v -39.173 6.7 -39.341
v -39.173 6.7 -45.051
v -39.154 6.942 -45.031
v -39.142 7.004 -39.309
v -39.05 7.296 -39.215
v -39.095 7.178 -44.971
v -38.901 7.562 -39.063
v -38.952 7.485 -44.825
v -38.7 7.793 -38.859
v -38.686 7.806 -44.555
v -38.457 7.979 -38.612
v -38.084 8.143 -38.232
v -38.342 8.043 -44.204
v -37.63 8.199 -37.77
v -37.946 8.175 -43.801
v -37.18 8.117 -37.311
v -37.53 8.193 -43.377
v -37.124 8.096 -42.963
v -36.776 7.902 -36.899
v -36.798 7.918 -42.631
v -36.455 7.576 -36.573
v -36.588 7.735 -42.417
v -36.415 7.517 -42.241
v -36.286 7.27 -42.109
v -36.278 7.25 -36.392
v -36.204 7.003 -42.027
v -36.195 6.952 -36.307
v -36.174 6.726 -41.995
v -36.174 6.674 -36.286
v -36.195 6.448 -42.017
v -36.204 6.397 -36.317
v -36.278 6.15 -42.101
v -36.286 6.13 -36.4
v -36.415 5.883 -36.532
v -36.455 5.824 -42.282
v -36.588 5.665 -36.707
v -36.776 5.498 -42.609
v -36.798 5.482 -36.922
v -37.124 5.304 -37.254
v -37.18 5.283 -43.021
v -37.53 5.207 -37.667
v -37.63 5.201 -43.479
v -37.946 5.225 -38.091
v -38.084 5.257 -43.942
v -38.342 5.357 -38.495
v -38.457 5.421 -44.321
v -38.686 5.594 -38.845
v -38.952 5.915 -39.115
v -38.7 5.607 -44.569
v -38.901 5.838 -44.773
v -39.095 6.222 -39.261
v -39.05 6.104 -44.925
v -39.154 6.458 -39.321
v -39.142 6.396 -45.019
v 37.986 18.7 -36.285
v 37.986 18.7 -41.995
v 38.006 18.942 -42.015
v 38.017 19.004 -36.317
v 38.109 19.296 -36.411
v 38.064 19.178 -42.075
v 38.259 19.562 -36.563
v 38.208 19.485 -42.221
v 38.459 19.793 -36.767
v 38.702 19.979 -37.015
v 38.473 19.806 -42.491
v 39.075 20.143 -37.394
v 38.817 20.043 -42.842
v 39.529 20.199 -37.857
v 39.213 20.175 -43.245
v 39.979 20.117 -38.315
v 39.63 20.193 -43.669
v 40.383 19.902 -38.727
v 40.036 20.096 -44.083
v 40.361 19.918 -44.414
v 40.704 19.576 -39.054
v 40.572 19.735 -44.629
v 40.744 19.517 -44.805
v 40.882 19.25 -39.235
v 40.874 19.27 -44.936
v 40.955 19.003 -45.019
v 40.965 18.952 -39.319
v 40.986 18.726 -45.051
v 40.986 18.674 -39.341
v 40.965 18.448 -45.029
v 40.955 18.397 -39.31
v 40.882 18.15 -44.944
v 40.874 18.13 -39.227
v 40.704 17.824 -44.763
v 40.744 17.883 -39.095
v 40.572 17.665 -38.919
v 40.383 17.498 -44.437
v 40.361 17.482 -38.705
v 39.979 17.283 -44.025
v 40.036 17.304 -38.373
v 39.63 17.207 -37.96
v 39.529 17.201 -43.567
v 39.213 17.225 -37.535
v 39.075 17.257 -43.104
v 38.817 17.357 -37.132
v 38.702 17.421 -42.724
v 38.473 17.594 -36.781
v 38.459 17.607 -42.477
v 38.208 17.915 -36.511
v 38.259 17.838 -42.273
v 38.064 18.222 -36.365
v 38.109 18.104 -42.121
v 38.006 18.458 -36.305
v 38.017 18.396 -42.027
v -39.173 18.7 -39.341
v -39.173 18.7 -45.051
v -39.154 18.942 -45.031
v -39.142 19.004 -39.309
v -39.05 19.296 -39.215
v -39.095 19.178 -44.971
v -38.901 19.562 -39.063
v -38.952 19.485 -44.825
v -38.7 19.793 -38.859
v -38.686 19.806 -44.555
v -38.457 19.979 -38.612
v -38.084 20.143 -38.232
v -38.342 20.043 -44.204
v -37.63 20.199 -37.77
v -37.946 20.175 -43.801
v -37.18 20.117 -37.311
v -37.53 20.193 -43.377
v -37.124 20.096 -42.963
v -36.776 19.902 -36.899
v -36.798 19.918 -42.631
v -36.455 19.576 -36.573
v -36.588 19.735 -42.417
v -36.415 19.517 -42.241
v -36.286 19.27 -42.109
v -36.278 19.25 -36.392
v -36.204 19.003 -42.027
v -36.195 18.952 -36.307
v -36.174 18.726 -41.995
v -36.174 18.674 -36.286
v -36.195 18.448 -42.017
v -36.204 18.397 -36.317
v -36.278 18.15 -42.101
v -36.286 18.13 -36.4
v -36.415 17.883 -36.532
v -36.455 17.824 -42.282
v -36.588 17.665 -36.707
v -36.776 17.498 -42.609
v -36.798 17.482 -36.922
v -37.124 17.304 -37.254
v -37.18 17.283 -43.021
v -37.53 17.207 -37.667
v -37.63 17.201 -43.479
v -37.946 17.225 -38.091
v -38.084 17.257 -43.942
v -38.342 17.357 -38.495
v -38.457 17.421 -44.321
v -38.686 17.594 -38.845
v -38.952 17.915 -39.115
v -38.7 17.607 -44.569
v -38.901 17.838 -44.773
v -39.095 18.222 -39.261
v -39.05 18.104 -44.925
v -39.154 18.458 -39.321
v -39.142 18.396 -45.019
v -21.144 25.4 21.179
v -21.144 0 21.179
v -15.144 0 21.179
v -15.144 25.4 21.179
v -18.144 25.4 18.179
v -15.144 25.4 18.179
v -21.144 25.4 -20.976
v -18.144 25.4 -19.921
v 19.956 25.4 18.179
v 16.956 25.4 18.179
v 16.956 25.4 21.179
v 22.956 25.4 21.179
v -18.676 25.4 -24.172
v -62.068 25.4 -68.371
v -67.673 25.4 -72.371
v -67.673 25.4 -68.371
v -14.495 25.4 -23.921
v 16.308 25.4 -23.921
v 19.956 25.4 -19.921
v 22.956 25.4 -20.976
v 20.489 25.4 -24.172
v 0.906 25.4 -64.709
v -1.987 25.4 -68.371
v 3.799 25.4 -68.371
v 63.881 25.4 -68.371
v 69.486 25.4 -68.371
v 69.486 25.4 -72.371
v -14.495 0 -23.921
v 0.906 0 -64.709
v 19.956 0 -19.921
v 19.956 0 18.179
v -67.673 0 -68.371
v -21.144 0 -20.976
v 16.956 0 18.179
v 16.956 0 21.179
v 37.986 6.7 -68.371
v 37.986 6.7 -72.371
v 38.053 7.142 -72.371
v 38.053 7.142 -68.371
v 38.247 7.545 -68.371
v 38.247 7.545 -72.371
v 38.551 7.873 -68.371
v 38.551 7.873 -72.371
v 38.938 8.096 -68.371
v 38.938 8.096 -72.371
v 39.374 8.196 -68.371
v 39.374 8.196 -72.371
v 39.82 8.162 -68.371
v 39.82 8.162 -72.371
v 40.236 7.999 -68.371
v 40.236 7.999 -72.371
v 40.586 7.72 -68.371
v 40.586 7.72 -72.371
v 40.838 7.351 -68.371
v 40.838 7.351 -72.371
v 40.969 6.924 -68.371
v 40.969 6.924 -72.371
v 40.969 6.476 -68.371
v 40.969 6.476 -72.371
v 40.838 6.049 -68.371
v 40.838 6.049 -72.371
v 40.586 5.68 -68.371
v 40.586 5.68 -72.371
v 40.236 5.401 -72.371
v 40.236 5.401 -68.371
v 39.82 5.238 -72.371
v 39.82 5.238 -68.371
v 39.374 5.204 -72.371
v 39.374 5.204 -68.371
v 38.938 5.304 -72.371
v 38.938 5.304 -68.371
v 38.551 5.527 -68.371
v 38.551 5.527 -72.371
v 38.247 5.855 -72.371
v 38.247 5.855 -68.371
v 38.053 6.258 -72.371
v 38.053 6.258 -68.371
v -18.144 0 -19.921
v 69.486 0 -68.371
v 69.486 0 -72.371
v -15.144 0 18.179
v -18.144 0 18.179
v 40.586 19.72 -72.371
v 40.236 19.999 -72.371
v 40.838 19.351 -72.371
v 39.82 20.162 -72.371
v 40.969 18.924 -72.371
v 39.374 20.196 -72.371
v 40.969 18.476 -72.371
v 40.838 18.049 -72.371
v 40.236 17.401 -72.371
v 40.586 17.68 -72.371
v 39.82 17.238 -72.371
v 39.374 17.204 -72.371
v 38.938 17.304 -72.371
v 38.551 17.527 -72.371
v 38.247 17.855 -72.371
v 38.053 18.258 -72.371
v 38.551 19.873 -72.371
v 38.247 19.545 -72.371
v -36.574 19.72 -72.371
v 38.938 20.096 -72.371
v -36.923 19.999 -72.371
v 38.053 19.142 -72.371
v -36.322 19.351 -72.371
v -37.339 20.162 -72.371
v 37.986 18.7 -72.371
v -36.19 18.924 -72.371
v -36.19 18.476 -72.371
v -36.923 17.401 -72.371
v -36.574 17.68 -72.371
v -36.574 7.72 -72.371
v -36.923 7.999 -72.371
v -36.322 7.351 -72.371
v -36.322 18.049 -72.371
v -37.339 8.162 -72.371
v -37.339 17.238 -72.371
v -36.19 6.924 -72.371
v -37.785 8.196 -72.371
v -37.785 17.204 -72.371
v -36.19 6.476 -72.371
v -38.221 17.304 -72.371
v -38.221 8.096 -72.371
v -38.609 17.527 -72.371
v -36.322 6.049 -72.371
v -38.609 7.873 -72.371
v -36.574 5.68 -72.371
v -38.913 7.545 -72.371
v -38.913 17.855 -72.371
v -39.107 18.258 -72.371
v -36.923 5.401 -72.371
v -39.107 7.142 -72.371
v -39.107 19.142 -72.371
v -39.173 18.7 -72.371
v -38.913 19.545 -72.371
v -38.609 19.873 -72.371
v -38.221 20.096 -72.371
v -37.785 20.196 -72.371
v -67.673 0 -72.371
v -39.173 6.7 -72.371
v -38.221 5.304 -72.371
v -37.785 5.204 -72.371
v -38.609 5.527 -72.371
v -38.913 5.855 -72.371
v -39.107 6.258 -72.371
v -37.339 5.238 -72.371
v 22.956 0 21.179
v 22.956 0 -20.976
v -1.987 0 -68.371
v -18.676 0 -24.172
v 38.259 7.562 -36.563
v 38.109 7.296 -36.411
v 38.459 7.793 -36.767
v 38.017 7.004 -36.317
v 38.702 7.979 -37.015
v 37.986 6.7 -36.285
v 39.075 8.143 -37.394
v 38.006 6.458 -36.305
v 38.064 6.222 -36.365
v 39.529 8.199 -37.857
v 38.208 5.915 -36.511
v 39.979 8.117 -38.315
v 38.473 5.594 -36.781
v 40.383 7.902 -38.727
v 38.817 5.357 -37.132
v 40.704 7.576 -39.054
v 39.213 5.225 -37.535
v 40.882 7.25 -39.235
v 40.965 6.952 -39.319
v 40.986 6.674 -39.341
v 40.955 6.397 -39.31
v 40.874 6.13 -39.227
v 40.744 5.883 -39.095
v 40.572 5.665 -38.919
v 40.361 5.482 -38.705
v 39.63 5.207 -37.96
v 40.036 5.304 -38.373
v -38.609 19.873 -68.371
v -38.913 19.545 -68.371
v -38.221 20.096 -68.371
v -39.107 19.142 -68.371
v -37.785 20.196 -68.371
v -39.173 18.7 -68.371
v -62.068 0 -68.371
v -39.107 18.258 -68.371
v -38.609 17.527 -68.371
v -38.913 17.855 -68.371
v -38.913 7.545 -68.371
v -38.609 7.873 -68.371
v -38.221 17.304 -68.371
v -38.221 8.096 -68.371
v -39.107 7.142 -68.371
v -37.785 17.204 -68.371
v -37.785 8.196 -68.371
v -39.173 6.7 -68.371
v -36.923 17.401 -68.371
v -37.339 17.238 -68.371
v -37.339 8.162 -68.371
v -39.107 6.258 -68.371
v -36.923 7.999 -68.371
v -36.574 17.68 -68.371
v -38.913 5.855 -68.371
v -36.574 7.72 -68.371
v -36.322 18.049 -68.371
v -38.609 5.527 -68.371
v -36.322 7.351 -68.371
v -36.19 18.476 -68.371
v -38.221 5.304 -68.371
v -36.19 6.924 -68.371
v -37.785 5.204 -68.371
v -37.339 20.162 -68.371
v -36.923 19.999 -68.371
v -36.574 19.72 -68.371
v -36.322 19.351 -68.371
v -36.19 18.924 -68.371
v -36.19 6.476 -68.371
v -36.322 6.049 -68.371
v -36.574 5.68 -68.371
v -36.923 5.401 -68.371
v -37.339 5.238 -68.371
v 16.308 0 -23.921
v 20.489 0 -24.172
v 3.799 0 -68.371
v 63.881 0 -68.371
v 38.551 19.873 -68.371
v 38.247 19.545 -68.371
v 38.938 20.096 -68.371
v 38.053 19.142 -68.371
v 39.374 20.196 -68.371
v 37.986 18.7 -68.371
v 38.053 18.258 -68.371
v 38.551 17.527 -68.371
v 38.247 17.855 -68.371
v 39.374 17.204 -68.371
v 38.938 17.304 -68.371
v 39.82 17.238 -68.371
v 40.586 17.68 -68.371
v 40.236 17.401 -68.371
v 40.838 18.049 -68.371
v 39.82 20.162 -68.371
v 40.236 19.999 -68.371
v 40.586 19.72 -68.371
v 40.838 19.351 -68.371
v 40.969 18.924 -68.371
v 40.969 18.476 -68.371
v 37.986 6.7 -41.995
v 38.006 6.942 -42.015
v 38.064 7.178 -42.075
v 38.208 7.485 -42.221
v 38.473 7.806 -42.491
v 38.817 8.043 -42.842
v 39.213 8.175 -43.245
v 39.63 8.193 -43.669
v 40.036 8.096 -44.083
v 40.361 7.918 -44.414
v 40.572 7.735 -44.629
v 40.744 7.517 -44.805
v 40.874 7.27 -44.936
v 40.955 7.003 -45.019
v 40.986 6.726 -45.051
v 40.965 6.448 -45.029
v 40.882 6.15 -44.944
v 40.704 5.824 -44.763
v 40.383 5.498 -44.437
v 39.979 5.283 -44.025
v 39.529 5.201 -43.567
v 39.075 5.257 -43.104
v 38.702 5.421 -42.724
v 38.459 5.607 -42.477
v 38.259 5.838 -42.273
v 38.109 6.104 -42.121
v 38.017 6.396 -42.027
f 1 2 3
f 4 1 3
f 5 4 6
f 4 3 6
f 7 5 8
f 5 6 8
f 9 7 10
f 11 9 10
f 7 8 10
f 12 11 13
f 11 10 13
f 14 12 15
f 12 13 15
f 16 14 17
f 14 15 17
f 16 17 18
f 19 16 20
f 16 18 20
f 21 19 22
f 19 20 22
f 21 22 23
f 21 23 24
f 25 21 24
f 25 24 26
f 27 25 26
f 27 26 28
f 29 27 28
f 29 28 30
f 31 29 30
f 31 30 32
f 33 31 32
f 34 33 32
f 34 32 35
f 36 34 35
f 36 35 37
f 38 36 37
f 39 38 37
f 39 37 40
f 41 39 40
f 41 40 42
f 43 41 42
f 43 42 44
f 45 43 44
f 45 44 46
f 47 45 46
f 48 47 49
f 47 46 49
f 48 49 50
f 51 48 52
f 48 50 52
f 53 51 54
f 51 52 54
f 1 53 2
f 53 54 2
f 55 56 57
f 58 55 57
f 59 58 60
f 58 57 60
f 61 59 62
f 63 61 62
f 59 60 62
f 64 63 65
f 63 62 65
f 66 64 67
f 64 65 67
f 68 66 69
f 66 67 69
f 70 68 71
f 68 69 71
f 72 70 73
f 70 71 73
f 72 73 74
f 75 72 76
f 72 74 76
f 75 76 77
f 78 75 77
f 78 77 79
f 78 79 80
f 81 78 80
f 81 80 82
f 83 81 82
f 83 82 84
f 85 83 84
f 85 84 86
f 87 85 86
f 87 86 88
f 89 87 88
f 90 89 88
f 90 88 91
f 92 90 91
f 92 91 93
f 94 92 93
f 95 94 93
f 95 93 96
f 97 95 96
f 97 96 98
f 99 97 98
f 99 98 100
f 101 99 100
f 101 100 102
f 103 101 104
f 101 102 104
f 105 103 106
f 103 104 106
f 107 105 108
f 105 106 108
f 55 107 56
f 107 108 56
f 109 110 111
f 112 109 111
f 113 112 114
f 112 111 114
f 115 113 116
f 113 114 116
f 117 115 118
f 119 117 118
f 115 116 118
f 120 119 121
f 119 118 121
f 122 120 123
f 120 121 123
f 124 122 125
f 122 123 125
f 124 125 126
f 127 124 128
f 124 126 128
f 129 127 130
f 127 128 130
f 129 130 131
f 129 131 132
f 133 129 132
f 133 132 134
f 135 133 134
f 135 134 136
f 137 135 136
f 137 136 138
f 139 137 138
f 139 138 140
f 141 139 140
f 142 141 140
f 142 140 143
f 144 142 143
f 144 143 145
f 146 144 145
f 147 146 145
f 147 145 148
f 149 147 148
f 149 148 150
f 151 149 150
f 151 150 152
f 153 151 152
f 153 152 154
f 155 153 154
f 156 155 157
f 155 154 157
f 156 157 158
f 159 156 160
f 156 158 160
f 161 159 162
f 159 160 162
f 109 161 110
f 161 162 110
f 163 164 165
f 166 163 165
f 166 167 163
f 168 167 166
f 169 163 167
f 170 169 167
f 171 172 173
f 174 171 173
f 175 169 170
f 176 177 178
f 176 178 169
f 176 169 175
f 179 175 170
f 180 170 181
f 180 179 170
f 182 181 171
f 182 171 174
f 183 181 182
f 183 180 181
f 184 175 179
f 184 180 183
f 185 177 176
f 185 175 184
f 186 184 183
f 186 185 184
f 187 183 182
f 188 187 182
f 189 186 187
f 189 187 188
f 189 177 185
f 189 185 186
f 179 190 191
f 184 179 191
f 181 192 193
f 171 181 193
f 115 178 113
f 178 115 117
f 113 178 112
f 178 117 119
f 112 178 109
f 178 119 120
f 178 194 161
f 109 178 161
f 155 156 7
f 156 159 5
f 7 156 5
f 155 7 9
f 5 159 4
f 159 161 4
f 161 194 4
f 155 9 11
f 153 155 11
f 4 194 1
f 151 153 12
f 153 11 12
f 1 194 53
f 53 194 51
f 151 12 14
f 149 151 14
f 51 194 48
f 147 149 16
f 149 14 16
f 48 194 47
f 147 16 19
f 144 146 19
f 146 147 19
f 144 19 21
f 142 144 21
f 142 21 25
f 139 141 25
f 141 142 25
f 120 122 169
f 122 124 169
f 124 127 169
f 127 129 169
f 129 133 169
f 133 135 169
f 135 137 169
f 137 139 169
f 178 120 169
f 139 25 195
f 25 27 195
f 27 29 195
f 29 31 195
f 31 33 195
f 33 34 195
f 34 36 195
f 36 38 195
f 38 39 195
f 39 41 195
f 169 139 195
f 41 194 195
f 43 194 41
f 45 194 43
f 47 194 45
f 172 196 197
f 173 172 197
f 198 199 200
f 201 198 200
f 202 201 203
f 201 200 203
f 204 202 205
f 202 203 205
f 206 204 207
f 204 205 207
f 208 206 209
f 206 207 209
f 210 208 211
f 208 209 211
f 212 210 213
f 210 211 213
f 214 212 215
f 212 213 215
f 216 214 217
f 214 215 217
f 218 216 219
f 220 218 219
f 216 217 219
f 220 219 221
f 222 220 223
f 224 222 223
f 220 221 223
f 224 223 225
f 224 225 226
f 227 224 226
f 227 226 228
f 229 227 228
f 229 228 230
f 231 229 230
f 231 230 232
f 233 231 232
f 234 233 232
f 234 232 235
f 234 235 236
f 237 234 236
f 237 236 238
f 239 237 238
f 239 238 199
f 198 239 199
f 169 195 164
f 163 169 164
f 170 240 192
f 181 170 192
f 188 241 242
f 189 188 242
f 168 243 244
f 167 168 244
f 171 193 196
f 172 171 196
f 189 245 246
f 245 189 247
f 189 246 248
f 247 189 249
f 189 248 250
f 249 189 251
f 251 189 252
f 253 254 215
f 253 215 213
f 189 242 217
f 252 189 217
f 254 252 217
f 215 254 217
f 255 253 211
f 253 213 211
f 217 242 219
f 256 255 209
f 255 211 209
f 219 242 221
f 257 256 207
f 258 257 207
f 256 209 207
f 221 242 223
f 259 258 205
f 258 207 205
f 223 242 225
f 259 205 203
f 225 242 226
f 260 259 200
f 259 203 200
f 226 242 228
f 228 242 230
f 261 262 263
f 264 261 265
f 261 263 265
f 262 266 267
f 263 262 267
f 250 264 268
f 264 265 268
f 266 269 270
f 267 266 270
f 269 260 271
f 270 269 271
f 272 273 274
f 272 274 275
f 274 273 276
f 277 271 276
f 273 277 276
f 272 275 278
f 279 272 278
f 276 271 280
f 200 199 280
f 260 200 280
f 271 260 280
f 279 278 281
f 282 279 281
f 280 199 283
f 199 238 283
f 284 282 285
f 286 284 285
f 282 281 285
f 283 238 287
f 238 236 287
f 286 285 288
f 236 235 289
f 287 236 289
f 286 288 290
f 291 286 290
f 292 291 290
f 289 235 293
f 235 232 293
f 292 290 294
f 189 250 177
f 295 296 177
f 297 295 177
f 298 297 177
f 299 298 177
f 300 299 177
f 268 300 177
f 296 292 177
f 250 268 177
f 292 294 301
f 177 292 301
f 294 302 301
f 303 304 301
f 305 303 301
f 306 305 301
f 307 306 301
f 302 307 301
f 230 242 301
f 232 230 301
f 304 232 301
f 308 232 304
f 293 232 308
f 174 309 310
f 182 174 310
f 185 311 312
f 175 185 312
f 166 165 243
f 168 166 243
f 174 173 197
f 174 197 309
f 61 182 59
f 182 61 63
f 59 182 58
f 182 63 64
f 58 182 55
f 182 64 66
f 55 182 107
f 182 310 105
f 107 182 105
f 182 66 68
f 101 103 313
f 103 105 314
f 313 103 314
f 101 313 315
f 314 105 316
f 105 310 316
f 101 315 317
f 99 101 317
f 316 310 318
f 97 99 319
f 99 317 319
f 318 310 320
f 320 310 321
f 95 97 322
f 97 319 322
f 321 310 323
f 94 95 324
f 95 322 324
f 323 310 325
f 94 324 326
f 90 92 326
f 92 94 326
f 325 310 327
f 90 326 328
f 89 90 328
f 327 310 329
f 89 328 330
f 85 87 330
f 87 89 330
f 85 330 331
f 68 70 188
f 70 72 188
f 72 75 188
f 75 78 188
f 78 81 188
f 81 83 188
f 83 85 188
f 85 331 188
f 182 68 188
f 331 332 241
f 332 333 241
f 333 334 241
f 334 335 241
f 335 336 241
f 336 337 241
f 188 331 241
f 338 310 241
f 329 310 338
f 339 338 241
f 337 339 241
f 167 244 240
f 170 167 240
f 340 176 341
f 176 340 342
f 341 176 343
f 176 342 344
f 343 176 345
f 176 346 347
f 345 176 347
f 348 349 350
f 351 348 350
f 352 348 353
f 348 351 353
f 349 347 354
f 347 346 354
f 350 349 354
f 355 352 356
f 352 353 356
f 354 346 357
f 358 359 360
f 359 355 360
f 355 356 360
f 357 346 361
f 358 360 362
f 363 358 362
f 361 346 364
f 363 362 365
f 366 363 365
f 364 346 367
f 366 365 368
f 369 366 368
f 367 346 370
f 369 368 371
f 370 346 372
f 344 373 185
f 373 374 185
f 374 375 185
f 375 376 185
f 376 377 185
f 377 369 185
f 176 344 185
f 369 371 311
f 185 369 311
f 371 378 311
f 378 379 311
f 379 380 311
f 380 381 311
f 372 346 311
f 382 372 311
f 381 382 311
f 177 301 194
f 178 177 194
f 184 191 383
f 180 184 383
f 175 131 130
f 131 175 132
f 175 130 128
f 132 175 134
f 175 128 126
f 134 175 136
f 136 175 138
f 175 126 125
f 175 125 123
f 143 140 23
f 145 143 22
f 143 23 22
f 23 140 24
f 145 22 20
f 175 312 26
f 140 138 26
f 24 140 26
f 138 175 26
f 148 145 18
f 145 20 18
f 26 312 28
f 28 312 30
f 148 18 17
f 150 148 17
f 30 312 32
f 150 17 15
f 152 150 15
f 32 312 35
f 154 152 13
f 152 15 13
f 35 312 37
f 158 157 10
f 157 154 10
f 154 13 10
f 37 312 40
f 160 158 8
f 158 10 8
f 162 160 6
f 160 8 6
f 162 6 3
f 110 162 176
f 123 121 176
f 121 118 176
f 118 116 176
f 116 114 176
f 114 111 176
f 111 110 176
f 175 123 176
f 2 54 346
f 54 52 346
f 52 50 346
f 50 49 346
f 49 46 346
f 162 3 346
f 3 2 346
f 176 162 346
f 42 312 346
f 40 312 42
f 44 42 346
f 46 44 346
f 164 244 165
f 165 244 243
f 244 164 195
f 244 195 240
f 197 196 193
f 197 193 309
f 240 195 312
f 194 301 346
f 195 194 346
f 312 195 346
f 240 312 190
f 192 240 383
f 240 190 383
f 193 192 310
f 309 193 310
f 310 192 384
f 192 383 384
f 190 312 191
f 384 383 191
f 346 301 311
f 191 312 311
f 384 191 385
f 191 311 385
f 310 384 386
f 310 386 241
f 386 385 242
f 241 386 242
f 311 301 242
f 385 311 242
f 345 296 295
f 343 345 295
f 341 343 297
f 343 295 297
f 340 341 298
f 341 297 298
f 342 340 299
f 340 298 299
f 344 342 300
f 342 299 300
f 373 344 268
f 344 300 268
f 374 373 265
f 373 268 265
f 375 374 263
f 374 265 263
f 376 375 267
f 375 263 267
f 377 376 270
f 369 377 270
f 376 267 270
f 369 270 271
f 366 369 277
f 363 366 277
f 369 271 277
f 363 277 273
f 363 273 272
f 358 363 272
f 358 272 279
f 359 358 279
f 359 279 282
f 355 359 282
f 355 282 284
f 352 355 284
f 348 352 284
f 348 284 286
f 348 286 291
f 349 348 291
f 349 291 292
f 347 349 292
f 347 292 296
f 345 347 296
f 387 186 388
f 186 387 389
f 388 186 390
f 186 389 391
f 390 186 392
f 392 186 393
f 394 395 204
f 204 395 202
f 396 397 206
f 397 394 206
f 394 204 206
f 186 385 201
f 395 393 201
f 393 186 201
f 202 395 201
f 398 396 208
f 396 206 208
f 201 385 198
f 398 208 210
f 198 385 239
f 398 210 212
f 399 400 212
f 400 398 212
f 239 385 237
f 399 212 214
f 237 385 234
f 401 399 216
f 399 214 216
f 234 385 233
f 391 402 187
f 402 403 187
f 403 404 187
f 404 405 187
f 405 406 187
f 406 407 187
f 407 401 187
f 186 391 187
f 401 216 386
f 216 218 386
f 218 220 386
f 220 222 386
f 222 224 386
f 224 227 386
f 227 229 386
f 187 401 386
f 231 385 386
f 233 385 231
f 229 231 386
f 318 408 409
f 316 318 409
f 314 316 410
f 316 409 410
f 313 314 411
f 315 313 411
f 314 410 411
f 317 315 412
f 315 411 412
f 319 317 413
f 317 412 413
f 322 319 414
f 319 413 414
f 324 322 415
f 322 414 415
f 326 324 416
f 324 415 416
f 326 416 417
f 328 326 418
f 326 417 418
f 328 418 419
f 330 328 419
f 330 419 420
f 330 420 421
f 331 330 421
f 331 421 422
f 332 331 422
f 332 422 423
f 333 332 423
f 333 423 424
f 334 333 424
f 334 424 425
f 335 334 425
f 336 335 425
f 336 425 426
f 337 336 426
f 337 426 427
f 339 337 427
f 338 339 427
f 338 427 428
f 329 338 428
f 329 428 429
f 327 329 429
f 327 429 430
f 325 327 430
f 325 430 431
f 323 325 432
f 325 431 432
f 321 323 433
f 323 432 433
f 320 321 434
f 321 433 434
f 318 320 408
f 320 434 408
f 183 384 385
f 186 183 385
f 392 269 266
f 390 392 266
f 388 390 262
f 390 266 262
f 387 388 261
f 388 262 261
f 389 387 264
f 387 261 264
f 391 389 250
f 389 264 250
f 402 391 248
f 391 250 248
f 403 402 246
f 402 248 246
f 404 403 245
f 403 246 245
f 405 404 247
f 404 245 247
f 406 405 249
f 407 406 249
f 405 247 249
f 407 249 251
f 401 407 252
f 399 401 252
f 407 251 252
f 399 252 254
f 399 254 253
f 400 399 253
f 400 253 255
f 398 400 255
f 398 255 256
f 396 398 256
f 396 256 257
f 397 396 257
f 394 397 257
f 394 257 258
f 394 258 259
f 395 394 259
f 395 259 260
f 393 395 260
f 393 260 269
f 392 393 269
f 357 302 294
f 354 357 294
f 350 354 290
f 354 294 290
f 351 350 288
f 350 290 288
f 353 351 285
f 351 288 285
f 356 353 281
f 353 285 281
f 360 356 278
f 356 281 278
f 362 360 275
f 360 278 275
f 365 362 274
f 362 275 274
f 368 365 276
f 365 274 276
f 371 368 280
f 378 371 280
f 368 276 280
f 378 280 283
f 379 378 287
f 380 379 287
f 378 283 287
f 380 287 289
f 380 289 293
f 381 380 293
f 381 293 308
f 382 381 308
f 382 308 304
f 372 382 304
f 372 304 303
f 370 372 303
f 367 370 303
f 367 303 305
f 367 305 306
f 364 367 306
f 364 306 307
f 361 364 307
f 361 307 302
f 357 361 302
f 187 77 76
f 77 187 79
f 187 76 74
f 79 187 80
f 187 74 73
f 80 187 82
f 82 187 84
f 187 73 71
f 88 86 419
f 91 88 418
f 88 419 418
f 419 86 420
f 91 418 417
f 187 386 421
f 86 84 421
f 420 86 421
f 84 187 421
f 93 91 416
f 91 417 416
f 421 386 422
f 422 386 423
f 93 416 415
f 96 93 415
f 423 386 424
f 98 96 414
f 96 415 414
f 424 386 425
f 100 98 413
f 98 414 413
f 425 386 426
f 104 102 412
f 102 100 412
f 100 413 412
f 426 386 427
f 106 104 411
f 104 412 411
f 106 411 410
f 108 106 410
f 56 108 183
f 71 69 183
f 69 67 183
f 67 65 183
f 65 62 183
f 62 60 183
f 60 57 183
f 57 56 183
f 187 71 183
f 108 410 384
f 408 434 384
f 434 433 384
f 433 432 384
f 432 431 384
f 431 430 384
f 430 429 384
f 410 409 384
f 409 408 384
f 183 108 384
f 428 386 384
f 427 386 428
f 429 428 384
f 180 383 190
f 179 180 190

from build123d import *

# Parameters (mm, degrees)
BOSS_EXTRUDE1_DEPTH = 25.4
SKETCH2_R           = 1.5
CUT_EXTRUDE1_DEPTH  = 120.2689793


with BuildPart() as part:
    # Sketch1 → Boss-Extrude1 (new body)
    with BuildSketch(Plane(origin=(0, 0, 0), x_dir=(1, 0, 0), z_dir=(0, 1, 0))):
        Polygon((-21.143554781, 20.976139754), (-21.143554781, -21.178999859), (-15.143554781, -21.178999859), (-15.143554781, -18.178999859), (-18.143554781, -18.178999859), (-18.143554781, 19.921000141), (-19.143705232, 18.939106358), align=None)
        Polygon((16.956445219, -18.178999859), (16.956445219, -21.178999859), (22.956445219, -21.178999859), (22.956445219, 20.976139754), (20.956595671, 18.939106358), (19.956445219, 19.921000141), (19.956445219, -18.178999859), align=None)
        Polygon((-18.000706286, 20.061241092), (-18.143554781, 19.921000141), (-17.629307024, 19.921000141), align=None)
        Polygon((-21.143554781, 23.921000141), (-21.143554781, 20.976139754), (-19.143705232, 18.939106358), (-18.143554781, 19.921000141), (-18.000706286, 20.061241092), (-19.950434941, 20.797461723), (-18.770981881, 23.921000141), align=None)
        Polygon((-18.429197778, 23.921000141), (-18.770981881, 23.921000141), (-19.950434941, 20.797461723), (-18.000706286, 20.061241092), (-16.289346466, 21.741361883), align=None)
        Polygon((-14.495314995, 23.921000141), (-18.429197778, 23.921000141), (-16.289346466, 21.741361883), (-18.000706286, 20.061241092), (-17.629307024, 19.921000141), (-16.005721338, 19.921000141), align=None)
        Polygon((-18.676040592, 24.172432584), (-18.770981881, 23.921000141), (-18.429197778, 23.921000141), align=None)
        Polygon((-67.6732731, 68.371000141), (-21.143554781, 20.976139754), (-21.143554781, 23.921000141), (-18.770981881, 23.921000141), (-18.676040592, 24.172432584), (-62.06781096, 68.371000141), align=None)
        Polygon((-18.676040592, 24.172432584), (-18.429197778, 23.921000141), (-14.495314995, 23.921000141), (0.906445219, 64.70938874), (-0.476185052, 68.371000141), (-1.986591395, 68.371000141), align=None)
        Polygon((16.308205433, 23.921000141), (-14.495314995, 23.921000141), (-16.005721338, 19.921000141), (17.818611776, 19.921000141), align=None)
        Polygon((17.818611776, 19.921000141), (19.442197463, 19.921000141), (19.813596724, 20.061241092), (18.102236904, 21.741361883), (20.242088216, 23.921000141), (16.308205433, 23.921000141), align=None)
        Polygon((21.763325379, 20.797461723), (20.583872319, 23.921000141), (20.242088216, 23.921000141), (18.102236904, 21.741361883), (19.813596724, 20.061241092), align=None)
        Polygon((20.956595671, 18.939106358), (22.956445219, 20.976139754), (22.956445219, 23.921000141), (20.583872319, 23.921000141), (21.763325379, 20.797461723), (19.813596724, 20.061241092), (19.956445219, 19.921000141), align=None)
        Polygon((19.442197463, 19.921000141), (19.956445219, 19.921000141), (19.813596724, 20.061241092), align=None)
        Polygon((0.906445219, 64.70938874), (16.308205433, 23.921000141), (20.242088216, 23.921000141), (20.48893103, 24.172432584), (3.799481834, 68.371000141), (2.289075491, 68.371000141), align=None)
        Polygon((22.956445219, 23.921000141), (22.956445219, 20.976139754), (69.486163538, 68.371000141), (63.880701399, 68.371000141), (20.48893103, 24.172432584), (20.583872319, 23.921000141), align=None)
        Polygon((63.880701399, 68.371000141), (69.486163538, 68.371000141), (66.631804771, 71.173255667), align=None)
        Polygon((-67.6732731, 72.371000141), (-67.6732731, 68.371000141), (-64.818914333, 71.173255667), (-62.06781096, 68.371000141), (-1.986591395, 68.371000141), (-1.35741728, 70.037238153), (0.906445219, 69.182400084), (3.170307718, 70.037238153), (3.799481834, 68.371000141), (63.880701399, 68.371000141), (66.631804771, 71.173255667), (69.486163538, 68.371000141), (69.486163538, 72.371000141), align=None)
        Polygon((2.289075491, 68.371000141), (-0.476185052, 68.371000141), (0.906445219, 64.70938874), align=None)
        Polygon((-1.35741728, 70.037238153), (-1.986591395, 68.371000141), (-0.476185052, 68.371000141), (-0.571798584, 68.62421288), (0.906445219, 69.182400084), align=None)
        Polygon((-0.571798584, 68.62421288), (-0.476185052, 68.371000141), (2.289075491, 68.371000141), (2.384689022, 68.62421288), (0.906445219, 69.182400084), align=None)
        Polygon((2.384689022, 68.62421288), (2.289075491, 68.371000141), (3.799481834, 68.371000141), (3.170307718, 70.037238153), (0.906445219, 69.182400084), align=None)
        Polygon((-64.818914333, 71.173255667), (-67.6732731, 68.371000141), (-62.06781096, 68.371000141), align=None)
        Polygon((20.242088216, 23.921000141), (20.583872319, 23.921000141), (20.48893103, 24.172432584), align=None)
    extrude(amount=BOSS_EXTRUDE1_DEPTH)

    # Sketch2 → Cut-Extrude1 (cut, through all)
    with BuildSketch(Plane(origin=(0, 0, -72.371000141), x_dir=(-1, 0, 0), z_dir=(0, 0, -1))):
        with Locations((37.6732731, 6.7)):
            Circle(SKETCH2_R)
        with Locations((37.6732731, 18.7)):
            Circle(SKETCH2_R)
        with Locations((-39.486163538, 18.7)):
            Circle(SKETCH2_R)
        with Locations((-39.486163538, 6.7)):
            Circle(SKETCH2_R)
    extrude(amount=-CUT_EXTRUDE1_DEPTH, mode=Mode.SUBTRACT)


solid = part.part
